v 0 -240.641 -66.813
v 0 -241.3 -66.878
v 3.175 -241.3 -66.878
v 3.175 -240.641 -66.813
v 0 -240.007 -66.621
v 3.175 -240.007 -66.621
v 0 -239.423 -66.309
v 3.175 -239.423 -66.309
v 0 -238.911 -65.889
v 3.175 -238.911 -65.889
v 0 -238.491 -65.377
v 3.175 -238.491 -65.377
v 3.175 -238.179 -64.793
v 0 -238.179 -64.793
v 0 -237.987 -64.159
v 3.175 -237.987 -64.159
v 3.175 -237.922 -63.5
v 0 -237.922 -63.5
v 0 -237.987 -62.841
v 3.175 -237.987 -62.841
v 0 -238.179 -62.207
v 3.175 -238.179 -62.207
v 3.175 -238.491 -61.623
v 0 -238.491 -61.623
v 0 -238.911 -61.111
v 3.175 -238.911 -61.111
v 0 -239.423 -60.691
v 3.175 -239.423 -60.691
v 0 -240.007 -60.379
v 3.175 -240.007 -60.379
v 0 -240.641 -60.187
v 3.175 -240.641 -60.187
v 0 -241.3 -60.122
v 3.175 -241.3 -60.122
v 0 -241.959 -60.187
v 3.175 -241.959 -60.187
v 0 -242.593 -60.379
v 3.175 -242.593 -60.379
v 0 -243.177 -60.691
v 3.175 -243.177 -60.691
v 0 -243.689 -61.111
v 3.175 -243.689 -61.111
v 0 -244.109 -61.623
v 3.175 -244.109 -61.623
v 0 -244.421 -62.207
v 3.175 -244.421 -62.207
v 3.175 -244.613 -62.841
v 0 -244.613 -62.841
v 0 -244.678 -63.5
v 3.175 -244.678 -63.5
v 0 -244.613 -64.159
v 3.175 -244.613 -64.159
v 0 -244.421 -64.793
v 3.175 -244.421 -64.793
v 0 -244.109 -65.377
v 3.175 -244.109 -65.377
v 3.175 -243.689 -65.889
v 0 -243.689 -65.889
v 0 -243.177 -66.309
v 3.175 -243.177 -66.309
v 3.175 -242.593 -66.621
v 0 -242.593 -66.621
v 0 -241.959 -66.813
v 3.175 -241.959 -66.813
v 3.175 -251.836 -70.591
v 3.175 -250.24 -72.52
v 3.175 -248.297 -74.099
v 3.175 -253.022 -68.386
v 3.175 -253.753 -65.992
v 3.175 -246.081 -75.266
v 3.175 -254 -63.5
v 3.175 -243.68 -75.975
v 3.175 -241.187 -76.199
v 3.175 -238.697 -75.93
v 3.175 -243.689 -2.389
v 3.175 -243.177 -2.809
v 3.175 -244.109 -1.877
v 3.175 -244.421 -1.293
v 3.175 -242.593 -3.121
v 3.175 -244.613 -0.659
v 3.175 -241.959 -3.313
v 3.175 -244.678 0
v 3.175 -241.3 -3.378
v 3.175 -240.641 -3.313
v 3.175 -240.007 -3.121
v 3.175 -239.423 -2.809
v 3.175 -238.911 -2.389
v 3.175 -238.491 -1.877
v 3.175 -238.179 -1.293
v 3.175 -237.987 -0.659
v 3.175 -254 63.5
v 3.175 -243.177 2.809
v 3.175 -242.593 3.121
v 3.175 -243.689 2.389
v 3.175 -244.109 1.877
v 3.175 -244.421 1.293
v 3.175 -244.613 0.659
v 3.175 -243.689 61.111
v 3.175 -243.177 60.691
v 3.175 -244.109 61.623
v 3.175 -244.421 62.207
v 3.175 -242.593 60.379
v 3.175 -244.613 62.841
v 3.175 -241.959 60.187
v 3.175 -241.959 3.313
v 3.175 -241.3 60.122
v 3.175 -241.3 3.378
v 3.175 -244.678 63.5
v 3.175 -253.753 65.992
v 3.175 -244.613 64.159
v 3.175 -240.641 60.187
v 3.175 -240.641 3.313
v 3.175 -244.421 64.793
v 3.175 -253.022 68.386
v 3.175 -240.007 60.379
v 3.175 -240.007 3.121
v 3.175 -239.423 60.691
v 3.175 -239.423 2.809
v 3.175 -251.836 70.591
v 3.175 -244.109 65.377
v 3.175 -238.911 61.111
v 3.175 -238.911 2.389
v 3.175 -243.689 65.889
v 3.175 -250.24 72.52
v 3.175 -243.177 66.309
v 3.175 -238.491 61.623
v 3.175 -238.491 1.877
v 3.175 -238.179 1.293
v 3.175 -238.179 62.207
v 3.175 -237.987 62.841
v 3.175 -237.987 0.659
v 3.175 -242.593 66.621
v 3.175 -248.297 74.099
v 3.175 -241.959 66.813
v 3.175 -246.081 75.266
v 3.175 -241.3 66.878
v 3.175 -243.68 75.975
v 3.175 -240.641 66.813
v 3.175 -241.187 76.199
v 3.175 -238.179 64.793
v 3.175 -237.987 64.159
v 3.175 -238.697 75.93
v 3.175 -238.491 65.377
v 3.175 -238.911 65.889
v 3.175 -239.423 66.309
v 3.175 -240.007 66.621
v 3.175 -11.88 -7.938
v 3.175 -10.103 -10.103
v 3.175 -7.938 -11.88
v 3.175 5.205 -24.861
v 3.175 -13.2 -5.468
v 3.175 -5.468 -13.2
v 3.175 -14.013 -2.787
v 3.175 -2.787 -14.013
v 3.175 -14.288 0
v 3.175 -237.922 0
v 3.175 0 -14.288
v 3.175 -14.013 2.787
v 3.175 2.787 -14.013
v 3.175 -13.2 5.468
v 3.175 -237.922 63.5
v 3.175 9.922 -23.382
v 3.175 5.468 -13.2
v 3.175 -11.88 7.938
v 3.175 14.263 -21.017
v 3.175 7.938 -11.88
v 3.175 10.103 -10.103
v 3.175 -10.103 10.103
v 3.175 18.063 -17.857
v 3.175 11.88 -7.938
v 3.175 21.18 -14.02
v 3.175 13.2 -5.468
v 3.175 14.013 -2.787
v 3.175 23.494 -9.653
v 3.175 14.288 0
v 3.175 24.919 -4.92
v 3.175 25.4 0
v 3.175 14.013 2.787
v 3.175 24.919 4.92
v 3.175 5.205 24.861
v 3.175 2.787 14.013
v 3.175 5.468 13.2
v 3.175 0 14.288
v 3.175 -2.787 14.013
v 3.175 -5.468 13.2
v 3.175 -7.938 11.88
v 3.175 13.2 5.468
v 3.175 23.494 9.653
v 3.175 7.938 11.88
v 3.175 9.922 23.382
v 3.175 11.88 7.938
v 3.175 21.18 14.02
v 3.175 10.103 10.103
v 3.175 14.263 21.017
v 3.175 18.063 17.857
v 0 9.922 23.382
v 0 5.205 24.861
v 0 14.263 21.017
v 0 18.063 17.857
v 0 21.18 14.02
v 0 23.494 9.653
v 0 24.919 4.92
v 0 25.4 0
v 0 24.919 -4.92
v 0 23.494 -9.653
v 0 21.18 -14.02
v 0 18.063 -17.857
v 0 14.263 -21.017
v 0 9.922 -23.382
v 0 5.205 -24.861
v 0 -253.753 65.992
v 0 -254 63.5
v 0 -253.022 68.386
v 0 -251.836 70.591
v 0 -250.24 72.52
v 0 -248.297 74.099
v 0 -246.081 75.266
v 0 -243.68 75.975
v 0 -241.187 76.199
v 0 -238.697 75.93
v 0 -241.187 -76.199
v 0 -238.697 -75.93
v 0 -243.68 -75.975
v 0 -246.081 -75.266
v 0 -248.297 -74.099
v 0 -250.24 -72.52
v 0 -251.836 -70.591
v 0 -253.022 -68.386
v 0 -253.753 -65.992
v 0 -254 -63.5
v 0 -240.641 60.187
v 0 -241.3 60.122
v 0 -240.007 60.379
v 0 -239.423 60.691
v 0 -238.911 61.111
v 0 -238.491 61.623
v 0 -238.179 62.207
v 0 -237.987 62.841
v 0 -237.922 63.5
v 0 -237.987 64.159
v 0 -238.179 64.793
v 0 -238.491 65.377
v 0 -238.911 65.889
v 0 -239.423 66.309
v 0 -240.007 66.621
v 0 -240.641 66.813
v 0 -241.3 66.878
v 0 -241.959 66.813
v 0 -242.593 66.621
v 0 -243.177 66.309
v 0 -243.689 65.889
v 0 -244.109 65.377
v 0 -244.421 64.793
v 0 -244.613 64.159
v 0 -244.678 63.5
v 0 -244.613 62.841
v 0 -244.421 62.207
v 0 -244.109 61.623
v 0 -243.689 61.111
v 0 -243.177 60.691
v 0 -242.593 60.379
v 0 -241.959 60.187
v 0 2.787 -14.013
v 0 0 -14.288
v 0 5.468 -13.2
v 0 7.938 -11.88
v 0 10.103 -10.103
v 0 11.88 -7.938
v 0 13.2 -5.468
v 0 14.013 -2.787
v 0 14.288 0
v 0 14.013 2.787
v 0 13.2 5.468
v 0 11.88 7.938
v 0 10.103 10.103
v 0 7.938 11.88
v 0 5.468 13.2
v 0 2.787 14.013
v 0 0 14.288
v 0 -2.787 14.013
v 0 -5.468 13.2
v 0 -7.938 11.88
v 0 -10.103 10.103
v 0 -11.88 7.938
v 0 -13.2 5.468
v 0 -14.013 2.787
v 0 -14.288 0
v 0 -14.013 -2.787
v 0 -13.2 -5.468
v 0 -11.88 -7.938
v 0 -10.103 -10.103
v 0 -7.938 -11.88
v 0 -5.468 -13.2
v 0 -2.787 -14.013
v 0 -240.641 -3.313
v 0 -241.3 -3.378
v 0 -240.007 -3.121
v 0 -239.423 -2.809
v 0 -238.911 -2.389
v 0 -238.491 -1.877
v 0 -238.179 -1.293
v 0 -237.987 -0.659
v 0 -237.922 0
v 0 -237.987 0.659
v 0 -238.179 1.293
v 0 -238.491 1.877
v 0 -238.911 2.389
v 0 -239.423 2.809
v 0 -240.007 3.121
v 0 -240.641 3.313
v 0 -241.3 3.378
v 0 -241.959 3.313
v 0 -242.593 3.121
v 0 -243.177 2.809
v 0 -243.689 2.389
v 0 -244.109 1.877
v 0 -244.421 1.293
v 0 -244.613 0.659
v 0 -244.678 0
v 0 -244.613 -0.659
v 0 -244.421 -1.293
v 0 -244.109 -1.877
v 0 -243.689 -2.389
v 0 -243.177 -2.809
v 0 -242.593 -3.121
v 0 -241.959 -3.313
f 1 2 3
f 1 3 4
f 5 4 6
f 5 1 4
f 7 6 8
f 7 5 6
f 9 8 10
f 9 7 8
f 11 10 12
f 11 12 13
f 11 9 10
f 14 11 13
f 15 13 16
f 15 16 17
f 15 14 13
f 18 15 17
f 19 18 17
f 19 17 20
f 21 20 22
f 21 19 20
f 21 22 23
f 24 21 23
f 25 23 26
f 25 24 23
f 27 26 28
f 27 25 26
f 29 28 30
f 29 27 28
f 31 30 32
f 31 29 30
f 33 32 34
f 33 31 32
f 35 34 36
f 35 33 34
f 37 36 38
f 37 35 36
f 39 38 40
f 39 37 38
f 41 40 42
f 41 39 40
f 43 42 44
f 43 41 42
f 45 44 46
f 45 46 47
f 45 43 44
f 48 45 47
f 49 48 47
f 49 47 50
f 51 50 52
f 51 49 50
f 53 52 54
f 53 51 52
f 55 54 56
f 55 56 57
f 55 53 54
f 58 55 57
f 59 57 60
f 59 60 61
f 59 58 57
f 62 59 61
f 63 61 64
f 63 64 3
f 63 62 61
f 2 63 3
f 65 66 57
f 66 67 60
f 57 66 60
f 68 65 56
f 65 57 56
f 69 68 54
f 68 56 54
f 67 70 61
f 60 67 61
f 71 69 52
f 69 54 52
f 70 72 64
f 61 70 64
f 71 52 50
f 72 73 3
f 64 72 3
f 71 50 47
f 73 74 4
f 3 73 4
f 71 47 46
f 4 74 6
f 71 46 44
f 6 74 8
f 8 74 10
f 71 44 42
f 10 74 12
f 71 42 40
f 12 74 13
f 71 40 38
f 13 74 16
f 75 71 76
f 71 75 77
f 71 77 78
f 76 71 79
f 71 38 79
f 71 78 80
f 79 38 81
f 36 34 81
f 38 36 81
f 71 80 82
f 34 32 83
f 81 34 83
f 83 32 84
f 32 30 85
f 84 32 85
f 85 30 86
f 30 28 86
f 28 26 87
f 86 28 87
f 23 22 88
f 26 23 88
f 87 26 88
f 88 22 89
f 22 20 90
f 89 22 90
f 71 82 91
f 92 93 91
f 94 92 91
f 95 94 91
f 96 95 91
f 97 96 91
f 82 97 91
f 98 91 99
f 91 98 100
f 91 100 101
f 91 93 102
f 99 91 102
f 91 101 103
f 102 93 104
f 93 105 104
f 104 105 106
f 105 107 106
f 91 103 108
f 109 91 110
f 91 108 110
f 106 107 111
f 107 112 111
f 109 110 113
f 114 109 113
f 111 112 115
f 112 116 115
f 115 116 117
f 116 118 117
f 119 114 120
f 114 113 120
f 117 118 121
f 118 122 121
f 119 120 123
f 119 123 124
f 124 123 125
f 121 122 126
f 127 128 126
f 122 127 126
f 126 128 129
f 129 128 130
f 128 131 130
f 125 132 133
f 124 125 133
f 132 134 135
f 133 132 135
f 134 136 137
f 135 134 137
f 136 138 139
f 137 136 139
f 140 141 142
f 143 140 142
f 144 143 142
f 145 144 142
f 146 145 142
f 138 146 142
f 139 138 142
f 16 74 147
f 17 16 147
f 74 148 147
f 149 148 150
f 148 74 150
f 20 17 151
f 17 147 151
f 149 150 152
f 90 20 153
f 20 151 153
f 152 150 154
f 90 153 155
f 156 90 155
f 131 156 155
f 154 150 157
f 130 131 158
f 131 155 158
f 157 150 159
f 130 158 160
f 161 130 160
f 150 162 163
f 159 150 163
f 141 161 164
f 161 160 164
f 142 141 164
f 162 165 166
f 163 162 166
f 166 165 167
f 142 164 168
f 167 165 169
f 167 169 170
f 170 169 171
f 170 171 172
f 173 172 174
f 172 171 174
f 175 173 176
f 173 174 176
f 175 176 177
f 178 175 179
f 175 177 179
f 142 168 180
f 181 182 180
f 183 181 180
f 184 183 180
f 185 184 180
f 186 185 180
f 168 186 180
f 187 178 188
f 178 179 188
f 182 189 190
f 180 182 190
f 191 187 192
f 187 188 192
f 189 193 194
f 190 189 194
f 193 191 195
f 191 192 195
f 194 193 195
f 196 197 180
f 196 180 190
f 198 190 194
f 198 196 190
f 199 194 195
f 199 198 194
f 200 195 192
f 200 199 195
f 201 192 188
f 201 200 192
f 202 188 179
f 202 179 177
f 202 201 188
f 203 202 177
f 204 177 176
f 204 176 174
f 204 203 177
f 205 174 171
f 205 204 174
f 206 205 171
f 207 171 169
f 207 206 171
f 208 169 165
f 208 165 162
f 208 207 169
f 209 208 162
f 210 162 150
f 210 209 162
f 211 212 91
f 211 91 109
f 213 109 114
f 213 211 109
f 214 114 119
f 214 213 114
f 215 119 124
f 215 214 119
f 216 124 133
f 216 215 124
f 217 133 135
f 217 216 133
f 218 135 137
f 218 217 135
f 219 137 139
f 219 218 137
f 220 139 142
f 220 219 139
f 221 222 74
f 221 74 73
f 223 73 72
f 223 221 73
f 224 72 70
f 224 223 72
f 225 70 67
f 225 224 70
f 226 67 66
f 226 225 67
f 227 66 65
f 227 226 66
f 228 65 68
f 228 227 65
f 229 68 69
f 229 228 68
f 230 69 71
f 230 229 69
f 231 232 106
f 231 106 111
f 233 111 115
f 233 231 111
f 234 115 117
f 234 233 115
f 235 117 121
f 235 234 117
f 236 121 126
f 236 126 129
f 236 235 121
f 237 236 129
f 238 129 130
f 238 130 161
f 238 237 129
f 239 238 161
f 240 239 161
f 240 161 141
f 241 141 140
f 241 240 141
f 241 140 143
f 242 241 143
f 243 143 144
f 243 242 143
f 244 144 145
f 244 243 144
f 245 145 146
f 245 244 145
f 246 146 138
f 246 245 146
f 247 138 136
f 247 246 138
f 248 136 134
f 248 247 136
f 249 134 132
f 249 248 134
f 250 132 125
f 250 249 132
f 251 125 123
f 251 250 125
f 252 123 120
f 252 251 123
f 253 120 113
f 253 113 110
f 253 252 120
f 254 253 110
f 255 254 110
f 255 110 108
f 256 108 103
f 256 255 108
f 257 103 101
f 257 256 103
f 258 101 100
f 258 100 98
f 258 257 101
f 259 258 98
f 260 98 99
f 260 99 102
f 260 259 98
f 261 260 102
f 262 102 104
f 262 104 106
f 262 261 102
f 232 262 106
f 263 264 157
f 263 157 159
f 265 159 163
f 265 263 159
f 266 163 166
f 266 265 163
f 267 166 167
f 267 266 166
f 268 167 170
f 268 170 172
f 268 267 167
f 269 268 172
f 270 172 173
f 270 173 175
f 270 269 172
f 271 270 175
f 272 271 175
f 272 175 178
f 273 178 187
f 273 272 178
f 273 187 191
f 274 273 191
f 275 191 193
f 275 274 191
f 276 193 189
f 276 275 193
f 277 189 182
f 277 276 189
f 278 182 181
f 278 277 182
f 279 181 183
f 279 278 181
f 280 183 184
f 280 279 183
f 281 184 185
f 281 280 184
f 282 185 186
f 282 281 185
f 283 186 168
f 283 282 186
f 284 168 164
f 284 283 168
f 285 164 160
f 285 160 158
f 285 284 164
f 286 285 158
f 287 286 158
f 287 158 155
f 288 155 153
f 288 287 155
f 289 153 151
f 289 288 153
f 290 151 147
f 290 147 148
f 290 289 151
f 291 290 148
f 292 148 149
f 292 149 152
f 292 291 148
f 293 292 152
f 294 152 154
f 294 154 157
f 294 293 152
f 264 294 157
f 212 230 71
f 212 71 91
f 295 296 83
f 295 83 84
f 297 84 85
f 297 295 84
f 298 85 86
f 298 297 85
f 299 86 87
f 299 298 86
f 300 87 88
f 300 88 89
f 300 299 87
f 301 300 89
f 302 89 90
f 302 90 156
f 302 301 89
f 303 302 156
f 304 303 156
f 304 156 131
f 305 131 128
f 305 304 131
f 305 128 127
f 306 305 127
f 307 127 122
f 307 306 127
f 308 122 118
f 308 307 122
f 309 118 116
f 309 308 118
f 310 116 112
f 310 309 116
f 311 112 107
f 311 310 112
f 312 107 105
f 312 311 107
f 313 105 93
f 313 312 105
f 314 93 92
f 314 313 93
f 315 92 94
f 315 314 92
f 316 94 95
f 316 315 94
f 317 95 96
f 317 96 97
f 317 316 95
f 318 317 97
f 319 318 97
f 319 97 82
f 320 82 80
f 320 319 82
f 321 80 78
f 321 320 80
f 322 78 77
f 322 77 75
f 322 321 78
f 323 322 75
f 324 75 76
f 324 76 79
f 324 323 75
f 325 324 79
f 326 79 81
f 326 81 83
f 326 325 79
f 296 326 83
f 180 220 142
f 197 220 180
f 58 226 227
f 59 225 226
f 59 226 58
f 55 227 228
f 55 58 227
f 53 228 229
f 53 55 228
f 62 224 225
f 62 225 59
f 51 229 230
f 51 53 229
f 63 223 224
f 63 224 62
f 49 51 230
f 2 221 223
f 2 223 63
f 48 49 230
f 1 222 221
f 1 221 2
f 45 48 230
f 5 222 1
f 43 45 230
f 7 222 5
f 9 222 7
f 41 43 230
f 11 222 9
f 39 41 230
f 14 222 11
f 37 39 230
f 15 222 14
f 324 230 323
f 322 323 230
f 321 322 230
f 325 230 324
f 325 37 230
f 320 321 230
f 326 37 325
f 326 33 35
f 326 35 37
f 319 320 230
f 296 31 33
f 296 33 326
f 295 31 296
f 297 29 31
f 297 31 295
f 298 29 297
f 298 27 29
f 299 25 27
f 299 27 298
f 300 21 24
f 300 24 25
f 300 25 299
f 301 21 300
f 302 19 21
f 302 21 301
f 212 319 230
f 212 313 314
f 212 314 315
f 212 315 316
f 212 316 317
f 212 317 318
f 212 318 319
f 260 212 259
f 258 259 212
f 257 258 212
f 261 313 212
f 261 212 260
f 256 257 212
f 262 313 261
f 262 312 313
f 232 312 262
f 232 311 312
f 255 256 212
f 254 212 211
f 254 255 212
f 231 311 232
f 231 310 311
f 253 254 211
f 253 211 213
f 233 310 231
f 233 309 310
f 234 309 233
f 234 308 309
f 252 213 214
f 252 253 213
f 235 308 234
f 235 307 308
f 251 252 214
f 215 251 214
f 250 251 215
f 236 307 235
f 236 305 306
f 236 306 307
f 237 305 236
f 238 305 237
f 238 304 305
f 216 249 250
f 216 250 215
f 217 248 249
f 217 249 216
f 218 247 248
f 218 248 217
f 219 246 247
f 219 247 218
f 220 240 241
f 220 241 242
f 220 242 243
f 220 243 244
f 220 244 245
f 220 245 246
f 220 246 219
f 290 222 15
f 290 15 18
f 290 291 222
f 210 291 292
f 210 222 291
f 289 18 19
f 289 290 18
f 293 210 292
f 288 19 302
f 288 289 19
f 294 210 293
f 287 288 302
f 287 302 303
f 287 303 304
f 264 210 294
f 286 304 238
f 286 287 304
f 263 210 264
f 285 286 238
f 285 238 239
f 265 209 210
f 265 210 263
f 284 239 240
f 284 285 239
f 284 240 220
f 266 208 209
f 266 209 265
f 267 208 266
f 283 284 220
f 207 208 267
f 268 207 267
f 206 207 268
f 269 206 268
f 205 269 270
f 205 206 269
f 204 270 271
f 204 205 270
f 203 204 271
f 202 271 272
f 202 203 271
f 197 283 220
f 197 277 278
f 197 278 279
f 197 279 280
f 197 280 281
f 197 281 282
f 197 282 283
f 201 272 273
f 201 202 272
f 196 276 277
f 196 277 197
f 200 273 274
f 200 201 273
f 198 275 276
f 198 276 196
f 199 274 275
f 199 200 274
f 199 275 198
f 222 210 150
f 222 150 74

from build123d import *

# Parameters (mm, degrees)
SKETCH1_R           = 14.2875
SKETCH1_R_2         = 3.3782
BOSS_EXTRUDE1_DEPTH = 3.175


with BuildPart() as part:
    # Sketch1 → Boss-Extrude1 (new body)
    with BuildSketch(Plane(origin=(0, 0, 0), x_dir=(0, 0, -1), z_dir=(1, 0, 0))):
        with BuildLine():
            Line((-75.93043495, -238.69725396), (-24.860869901, 5.205492079))
            ThreePointArc((-24.860869901, 5.205492079), (0, 25.4), (24.860869901, 5.205492079))
            Line((24.860869901, 5.205492079), (75.93043495, -238.69725396))
            ThreePointArc((75.93043495, -238.69725396), (73.357608095, -249.307344294), (63.5, -254))
            Line((63.5, -254), (-63.5, -254))
            ThreePointArc((-63.5, -254), (-73.357608095, -249.307344294), (-75.93043495, -238.69725396))
        make_face()
        Circle(SKETCH1_R, mode=Mode.SUBTRACT)
        with Locations((-63.5, -241.3)):
            Circle(SKETCH1_R_2, mode=Mode.SUBTRACT)
        with Locations((0, -241.3)):
            Circle(SKETCH1_R_2, mode=Mode.SUBTRACT)
        with Locations((63.5, -241.3)):
            Circle(SKETCH1_R_2, mode=Mode.SUBTRACT)
    extrude(amount=BOSS_EXTRUDE1_DEPTH)


solid = part.part
